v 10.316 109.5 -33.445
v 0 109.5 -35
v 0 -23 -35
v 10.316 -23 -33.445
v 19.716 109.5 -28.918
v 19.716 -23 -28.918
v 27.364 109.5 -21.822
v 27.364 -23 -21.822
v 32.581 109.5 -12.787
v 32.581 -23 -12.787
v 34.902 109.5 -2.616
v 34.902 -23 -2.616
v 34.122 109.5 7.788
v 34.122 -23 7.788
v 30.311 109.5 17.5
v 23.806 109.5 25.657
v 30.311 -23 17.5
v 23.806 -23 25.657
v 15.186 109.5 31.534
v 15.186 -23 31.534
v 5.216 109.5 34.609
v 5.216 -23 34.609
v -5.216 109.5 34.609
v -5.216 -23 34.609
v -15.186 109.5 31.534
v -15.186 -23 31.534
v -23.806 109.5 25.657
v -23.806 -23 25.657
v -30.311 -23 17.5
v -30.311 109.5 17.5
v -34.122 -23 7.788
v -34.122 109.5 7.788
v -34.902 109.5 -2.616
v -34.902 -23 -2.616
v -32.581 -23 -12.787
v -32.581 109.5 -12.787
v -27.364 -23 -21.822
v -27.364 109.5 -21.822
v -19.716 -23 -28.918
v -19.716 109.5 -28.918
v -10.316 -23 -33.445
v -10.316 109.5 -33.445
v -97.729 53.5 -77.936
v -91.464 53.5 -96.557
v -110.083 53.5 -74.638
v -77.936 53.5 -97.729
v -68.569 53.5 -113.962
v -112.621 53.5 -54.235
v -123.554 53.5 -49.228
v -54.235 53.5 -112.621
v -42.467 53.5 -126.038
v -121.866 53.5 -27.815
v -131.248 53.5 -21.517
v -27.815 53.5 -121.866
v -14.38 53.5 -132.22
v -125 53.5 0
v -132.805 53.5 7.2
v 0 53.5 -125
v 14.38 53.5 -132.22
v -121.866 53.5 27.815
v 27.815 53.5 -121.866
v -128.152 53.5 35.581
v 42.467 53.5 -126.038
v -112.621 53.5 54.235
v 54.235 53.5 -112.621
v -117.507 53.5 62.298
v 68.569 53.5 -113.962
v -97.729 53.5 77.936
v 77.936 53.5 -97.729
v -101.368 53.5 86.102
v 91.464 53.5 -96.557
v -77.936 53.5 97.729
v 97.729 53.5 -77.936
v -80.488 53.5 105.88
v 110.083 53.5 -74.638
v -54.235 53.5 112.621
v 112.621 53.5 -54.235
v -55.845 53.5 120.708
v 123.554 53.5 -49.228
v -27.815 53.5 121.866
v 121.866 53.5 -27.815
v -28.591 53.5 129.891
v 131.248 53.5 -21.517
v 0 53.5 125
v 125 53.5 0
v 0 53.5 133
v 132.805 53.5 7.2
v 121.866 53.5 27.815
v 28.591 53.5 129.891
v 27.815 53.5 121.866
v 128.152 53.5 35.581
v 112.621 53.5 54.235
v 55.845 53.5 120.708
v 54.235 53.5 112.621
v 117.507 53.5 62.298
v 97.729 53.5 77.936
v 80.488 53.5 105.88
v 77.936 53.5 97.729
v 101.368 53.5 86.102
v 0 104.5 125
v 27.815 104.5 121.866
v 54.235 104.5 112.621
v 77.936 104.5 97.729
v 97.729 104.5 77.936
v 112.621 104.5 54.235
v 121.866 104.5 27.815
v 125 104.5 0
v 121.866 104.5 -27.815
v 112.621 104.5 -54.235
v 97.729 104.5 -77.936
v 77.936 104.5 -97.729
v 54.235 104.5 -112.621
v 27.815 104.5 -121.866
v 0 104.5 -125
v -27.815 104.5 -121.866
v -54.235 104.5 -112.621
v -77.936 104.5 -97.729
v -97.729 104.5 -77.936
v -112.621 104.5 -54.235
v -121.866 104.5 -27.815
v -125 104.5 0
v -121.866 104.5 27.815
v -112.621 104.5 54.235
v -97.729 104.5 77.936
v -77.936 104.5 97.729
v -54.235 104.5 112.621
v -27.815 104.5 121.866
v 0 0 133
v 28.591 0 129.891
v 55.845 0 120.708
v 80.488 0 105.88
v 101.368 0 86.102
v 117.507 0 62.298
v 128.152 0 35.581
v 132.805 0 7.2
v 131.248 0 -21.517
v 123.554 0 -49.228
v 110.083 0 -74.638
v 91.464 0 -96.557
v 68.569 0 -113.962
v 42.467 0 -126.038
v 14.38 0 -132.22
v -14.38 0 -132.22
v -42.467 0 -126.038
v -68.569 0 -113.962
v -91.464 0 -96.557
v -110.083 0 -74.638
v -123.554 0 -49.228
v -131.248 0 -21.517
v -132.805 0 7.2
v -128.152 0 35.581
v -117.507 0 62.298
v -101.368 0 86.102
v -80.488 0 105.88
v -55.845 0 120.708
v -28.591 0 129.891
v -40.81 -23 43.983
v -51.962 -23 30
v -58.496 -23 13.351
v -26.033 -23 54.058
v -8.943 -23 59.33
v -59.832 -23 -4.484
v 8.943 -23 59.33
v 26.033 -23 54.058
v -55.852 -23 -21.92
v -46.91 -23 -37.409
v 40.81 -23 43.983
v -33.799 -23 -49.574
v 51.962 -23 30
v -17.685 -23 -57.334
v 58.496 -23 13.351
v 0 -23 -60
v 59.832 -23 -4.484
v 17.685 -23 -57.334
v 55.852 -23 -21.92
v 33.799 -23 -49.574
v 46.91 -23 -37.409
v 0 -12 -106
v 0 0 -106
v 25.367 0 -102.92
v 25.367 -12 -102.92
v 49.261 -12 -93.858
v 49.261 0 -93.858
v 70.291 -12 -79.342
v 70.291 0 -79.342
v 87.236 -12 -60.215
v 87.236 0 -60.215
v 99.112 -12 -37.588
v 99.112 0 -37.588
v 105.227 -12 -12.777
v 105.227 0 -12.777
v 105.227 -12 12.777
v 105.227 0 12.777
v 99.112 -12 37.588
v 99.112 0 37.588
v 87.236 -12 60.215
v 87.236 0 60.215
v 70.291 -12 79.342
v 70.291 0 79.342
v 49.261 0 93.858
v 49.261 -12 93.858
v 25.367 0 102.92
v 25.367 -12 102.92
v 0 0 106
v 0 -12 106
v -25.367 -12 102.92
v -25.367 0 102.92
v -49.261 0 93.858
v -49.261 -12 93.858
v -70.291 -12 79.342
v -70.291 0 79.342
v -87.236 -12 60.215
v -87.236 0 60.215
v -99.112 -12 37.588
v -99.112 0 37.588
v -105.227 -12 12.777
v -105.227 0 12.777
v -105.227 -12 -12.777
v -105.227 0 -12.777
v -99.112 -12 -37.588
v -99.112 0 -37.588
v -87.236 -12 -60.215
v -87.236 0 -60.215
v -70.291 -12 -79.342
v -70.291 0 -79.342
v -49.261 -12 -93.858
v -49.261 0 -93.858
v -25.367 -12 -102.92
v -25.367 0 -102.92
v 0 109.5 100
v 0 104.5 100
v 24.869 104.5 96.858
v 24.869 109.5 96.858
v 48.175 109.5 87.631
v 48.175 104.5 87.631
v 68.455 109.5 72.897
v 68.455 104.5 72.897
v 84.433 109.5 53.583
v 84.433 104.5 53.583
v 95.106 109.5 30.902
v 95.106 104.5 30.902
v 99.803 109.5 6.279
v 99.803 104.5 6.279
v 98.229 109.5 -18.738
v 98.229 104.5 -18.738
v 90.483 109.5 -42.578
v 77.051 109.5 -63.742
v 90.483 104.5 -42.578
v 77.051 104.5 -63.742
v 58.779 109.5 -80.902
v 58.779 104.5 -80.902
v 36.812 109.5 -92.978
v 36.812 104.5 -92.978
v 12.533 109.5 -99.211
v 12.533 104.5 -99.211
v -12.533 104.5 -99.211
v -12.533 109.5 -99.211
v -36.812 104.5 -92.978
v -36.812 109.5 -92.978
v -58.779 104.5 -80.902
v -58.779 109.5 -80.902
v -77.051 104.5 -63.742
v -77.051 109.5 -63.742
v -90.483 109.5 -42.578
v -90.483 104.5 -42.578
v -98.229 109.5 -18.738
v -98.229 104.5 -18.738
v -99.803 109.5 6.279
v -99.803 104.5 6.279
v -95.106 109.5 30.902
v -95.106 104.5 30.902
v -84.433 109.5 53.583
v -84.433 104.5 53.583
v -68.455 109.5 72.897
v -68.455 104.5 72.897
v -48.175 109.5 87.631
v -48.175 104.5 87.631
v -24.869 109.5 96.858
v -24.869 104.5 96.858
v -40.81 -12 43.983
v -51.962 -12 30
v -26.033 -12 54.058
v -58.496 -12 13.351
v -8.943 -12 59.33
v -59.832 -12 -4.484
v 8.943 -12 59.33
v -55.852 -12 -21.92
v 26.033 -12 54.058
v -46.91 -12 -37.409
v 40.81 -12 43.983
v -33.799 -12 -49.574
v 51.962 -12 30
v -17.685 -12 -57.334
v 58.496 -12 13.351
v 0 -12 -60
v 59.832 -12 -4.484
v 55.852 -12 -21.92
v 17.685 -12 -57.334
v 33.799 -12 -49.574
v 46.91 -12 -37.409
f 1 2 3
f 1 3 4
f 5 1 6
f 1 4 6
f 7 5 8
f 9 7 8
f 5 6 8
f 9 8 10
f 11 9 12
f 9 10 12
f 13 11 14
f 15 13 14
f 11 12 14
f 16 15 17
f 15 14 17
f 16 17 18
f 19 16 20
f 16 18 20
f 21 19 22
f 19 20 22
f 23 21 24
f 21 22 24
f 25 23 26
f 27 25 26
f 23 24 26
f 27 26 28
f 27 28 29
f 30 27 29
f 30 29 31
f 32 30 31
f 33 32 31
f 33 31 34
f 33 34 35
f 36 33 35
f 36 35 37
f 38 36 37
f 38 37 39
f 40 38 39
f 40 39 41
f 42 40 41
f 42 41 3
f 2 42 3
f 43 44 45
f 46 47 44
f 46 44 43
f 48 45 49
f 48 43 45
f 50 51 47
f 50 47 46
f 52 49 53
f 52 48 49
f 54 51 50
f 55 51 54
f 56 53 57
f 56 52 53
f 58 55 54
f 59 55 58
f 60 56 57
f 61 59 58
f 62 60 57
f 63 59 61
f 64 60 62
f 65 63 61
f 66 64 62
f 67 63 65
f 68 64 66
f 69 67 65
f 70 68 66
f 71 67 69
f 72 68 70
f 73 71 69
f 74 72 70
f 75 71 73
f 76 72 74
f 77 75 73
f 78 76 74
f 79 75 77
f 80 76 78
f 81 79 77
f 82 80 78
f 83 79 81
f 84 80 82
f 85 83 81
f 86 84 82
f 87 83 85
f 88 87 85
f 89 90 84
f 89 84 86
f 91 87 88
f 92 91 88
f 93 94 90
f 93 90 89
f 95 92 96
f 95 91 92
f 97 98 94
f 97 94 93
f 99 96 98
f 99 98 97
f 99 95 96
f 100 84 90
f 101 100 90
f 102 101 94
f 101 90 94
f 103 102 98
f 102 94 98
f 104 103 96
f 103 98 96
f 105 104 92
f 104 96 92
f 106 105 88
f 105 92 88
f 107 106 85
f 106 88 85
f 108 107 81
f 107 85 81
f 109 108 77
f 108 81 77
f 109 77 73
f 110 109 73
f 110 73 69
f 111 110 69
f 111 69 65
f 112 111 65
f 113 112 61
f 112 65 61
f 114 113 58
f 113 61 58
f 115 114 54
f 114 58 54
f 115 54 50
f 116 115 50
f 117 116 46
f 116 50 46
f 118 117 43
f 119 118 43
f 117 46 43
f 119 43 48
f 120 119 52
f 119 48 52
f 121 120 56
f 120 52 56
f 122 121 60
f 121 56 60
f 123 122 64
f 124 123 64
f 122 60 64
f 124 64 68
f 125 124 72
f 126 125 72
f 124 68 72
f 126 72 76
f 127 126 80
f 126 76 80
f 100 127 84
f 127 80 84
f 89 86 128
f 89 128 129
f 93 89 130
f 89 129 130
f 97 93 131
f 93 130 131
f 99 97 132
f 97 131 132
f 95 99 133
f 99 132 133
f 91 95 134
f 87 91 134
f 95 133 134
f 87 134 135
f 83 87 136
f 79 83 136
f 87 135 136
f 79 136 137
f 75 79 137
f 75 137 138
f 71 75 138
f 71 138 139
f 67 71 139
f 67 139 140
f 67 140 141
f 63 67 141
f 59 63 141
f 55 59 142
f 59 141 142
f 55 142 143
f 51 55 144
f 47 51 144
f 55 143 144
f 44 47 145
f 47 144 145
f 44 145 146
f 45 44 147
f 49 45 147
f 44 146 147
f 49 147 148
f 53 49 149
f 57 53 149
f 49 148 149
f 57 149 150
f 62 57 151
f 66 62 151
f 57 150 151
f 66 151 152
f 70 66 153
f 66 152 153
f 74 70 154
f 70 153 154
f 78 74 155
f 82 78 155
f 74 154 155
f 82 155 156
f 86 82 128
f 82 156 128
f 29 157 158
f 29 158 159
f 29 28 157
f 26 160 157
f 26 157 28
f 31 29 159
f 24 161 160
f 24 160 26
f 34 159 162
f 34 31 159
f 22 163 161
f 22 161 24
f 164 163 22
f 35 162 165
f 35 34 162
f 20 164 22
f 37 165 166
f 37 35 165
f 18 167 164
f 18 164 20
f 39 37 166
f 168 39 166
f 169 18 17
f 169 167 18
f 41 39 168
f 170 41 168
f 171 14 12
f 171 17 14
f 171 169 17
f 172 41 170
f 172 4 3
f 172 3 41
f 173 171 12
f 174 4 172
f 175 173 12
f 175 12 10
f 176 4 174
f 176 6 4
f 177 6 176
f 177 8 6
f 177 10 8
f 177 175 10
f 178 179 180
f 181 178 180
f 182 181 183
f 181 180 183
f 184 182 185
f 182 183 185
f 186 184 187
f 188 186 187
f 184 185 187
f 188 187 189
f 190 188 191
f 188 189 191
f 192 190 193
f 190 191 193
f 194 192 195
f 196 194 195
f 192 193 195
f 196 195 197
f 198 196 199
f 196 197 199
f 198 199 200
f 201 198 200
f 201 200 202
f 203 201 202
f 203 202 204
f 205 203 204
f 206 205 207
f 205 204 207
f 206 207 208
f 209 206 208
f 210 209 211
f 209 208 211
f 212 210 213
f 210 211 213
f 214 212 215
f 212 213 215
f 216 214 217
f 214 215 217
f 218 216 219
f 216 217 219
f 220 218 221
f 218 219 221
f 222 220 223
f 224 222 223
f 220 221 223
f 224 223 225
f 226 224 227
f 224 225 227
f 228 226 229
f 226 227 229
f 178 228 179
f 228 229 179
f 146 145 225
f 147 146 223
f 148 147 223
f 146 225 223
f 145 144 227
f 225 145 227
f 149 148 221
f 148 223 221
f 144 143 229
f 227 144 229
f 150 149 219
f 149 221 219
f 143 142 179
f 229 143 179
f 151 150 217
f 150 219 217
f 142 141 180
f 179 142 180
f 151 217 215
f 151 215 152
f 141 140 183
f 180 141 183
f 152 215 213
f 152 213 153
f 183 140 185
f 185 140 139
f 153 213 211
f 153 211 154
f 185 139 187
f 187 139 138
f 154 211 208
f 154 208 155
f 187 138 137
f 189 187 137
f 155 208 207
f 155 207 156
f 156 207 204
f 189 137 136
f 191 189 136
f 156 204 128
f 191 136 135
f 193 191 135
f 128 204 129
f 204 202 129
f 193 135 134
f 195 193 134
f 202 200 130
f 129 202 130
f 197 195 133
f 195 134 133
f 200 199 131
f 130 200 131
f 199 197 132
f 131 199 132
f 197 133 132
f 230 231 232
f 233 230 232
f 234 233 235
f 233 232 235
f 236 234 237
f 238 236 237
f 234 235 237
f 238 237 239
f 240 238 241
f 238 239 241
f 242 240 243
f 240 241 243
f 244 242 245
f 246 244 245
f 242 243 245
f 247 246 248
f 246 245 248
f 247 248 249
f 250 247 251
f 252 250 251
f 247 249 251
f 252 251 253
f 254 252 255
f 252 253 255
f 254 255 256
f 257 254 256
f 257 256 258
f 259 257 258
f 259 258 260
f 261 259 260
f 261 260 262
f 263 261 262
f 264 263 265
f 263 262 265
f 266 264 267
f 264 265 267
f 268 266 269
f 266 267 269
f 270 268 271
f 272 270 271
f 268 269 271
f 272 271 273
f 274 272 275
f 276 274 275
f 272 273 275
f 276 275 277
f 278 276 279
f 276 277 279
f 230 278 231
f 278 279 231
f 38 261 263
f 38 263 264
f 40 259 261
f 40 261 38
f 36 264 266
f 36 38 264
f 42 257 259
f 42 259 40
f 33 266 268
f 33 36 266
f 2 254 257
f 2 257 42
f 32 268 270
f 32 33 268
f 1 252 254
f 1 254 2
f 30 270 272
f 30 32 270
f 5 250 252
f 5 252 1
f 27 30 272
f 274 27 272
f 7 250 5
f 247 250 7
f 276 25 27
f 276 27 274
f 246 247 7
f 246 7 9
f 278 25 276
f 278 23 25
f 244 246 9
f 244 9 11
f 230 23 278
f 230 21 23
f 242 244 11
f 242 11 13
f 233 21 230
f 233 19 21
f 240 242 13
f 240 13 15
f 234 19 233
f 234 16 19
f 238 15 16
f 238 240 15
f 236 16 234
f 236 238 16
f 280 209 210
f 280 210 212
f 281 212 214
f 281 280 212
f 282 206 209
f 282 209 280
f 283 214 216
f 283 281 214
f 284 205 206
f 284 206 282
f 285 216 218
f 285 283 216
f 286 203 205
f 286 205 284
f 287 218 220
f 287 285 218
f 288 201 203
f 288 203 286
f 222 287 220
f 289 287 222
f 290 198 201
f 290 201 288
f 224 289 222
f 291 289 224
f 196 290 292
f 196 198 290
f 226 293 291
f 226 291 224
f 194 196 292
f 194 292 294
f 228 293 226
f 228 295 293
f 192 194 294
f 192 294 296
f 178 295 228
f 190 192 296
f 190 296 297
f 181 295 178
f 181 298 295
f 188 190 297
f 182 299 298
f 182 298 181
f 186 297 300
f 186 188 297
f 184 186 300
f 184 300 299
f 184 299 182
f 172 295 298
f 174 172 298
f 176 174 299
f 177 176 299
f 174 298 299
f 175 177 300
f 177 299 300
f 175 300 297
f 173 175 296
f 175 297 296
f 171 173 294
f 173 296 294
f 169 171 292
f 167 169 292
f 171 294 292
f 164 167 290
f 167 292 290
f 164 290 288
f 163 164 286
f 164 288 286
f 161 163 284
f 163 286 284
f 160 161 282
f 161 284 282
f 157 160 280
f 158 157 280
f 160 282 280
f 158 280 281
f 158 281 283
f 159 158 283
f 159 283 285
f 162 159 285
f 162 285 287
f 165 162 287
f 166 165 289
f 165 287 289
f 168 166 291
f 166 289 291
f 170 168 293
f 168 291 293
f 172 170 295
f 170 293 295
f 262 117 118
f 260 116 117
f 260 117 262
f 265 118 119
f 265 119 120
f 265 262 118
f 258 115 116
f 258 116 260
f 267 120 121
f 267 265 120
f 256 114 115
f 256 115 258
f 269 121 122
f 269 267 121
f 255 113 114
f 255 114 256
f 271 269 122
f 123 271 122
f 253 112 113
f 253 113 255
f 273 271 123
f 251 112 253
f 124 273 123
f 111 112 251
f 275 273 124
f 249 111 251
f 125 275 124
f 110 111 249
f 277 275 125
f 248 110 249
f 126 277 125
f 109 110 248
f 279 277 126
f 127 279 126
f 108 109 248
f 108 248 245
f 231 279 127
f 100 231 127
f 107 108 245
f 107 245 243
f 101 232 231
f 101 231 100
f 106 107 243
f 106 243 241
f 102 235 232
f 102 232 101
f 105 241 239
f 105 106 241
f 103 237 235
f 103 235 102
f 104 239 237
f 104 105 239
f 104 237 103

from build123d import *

# Parameters (mm, degrees)
SKETCH1_R           = 133
BOSS_EXTRUDE1_DEPTH = 53.5
SKETCH2_R           = 125
BOSS_EXTRUDE2_DEPTH = 51
SKETCH3_R           = 100
BOSS_EXTRUDE3_DEPTH = 5
SKETCH4_R           = 106
BOSS_EXTRUDE4_DEPTH = 12
SKETCH5_R           = 60
BOSS_EXTRUDE5_DEPTH = 11
SKETCH6_R           = 35
CUT_EXTRUDE1_DEPTH  = 231.074444474


with BuildPart() as part:
    # Sketch1 → Boss-Extrude1 (new body)
    with BuildSketch(Plane(origin=(0, 0, 0), x_dir=(1, 0, 0), z_dir=(0, 1, 0))):
        with Locations(Location((0, 0, 0), (0, 0, 270))):
            Circle(SKETCH1_R)
    extrude(amount=BOSS_EXTRUDE1_DEPTH)

    # Sketch2 → Boss-Extrude2 (add)
    with BuildSketch(Plane(origin=(0, 53.5, 0), x_dir=(1, 0, 0), z_dir=(0, 1, 0))):
        with Locations(Location((0, 0, 0), (0, 0, 270))):
            Circle(SKETCH2_R)
    extrude(amount=BOSS_EXTRUDE2_DEPTH)

    # Sketch3 → Boss-Extrude3 (add)
    with BuildSketch(Plane(origin=(0, 104.5, 0), x_dir=(1, 0, 0), z_dir=(0, 1, 0))):
        with Locations(Location((0, 0, 0), (0, 0, 270))):
            Circle(SKETCH3_R)
    extrude(amount=BOSS_EXTRUDE3_DEPTH)

    # Sketch4 → Boss-Extrude4 (add)
    with BuildSketch(Plane.XZ):
        with Locations(Location((0, 0, 0), (0, 0, 270))):
            Circle(SKETCH4_R)
    extrude(amount=BOSS_EXTRUDE4_DEPTH)

    # Sketch5 → Boss-Extrude5 (add)
    with BuildSketch(Plane.XZ.offset(12)):
        with Locations(Location((0, 0, 0), (0, 0, 270))):
            Circle(SKETCH5_R)
    extrude(amount=BOSS_EXTRUDE5_DEPTH)

    # Sketch6 → Cut-Extrude1 (cut, through all)
    with BuildSketch(Plane.XZ.offset(23)):
        with Locations(Location((0, 0, 0), (0, 0, 270))):
            Circle(SKETCH6_R)
    extrude(amount=-CUT_EXTRUDE1_DEPTH, mode=Mode.SUBTRACT)


solid = part.part
